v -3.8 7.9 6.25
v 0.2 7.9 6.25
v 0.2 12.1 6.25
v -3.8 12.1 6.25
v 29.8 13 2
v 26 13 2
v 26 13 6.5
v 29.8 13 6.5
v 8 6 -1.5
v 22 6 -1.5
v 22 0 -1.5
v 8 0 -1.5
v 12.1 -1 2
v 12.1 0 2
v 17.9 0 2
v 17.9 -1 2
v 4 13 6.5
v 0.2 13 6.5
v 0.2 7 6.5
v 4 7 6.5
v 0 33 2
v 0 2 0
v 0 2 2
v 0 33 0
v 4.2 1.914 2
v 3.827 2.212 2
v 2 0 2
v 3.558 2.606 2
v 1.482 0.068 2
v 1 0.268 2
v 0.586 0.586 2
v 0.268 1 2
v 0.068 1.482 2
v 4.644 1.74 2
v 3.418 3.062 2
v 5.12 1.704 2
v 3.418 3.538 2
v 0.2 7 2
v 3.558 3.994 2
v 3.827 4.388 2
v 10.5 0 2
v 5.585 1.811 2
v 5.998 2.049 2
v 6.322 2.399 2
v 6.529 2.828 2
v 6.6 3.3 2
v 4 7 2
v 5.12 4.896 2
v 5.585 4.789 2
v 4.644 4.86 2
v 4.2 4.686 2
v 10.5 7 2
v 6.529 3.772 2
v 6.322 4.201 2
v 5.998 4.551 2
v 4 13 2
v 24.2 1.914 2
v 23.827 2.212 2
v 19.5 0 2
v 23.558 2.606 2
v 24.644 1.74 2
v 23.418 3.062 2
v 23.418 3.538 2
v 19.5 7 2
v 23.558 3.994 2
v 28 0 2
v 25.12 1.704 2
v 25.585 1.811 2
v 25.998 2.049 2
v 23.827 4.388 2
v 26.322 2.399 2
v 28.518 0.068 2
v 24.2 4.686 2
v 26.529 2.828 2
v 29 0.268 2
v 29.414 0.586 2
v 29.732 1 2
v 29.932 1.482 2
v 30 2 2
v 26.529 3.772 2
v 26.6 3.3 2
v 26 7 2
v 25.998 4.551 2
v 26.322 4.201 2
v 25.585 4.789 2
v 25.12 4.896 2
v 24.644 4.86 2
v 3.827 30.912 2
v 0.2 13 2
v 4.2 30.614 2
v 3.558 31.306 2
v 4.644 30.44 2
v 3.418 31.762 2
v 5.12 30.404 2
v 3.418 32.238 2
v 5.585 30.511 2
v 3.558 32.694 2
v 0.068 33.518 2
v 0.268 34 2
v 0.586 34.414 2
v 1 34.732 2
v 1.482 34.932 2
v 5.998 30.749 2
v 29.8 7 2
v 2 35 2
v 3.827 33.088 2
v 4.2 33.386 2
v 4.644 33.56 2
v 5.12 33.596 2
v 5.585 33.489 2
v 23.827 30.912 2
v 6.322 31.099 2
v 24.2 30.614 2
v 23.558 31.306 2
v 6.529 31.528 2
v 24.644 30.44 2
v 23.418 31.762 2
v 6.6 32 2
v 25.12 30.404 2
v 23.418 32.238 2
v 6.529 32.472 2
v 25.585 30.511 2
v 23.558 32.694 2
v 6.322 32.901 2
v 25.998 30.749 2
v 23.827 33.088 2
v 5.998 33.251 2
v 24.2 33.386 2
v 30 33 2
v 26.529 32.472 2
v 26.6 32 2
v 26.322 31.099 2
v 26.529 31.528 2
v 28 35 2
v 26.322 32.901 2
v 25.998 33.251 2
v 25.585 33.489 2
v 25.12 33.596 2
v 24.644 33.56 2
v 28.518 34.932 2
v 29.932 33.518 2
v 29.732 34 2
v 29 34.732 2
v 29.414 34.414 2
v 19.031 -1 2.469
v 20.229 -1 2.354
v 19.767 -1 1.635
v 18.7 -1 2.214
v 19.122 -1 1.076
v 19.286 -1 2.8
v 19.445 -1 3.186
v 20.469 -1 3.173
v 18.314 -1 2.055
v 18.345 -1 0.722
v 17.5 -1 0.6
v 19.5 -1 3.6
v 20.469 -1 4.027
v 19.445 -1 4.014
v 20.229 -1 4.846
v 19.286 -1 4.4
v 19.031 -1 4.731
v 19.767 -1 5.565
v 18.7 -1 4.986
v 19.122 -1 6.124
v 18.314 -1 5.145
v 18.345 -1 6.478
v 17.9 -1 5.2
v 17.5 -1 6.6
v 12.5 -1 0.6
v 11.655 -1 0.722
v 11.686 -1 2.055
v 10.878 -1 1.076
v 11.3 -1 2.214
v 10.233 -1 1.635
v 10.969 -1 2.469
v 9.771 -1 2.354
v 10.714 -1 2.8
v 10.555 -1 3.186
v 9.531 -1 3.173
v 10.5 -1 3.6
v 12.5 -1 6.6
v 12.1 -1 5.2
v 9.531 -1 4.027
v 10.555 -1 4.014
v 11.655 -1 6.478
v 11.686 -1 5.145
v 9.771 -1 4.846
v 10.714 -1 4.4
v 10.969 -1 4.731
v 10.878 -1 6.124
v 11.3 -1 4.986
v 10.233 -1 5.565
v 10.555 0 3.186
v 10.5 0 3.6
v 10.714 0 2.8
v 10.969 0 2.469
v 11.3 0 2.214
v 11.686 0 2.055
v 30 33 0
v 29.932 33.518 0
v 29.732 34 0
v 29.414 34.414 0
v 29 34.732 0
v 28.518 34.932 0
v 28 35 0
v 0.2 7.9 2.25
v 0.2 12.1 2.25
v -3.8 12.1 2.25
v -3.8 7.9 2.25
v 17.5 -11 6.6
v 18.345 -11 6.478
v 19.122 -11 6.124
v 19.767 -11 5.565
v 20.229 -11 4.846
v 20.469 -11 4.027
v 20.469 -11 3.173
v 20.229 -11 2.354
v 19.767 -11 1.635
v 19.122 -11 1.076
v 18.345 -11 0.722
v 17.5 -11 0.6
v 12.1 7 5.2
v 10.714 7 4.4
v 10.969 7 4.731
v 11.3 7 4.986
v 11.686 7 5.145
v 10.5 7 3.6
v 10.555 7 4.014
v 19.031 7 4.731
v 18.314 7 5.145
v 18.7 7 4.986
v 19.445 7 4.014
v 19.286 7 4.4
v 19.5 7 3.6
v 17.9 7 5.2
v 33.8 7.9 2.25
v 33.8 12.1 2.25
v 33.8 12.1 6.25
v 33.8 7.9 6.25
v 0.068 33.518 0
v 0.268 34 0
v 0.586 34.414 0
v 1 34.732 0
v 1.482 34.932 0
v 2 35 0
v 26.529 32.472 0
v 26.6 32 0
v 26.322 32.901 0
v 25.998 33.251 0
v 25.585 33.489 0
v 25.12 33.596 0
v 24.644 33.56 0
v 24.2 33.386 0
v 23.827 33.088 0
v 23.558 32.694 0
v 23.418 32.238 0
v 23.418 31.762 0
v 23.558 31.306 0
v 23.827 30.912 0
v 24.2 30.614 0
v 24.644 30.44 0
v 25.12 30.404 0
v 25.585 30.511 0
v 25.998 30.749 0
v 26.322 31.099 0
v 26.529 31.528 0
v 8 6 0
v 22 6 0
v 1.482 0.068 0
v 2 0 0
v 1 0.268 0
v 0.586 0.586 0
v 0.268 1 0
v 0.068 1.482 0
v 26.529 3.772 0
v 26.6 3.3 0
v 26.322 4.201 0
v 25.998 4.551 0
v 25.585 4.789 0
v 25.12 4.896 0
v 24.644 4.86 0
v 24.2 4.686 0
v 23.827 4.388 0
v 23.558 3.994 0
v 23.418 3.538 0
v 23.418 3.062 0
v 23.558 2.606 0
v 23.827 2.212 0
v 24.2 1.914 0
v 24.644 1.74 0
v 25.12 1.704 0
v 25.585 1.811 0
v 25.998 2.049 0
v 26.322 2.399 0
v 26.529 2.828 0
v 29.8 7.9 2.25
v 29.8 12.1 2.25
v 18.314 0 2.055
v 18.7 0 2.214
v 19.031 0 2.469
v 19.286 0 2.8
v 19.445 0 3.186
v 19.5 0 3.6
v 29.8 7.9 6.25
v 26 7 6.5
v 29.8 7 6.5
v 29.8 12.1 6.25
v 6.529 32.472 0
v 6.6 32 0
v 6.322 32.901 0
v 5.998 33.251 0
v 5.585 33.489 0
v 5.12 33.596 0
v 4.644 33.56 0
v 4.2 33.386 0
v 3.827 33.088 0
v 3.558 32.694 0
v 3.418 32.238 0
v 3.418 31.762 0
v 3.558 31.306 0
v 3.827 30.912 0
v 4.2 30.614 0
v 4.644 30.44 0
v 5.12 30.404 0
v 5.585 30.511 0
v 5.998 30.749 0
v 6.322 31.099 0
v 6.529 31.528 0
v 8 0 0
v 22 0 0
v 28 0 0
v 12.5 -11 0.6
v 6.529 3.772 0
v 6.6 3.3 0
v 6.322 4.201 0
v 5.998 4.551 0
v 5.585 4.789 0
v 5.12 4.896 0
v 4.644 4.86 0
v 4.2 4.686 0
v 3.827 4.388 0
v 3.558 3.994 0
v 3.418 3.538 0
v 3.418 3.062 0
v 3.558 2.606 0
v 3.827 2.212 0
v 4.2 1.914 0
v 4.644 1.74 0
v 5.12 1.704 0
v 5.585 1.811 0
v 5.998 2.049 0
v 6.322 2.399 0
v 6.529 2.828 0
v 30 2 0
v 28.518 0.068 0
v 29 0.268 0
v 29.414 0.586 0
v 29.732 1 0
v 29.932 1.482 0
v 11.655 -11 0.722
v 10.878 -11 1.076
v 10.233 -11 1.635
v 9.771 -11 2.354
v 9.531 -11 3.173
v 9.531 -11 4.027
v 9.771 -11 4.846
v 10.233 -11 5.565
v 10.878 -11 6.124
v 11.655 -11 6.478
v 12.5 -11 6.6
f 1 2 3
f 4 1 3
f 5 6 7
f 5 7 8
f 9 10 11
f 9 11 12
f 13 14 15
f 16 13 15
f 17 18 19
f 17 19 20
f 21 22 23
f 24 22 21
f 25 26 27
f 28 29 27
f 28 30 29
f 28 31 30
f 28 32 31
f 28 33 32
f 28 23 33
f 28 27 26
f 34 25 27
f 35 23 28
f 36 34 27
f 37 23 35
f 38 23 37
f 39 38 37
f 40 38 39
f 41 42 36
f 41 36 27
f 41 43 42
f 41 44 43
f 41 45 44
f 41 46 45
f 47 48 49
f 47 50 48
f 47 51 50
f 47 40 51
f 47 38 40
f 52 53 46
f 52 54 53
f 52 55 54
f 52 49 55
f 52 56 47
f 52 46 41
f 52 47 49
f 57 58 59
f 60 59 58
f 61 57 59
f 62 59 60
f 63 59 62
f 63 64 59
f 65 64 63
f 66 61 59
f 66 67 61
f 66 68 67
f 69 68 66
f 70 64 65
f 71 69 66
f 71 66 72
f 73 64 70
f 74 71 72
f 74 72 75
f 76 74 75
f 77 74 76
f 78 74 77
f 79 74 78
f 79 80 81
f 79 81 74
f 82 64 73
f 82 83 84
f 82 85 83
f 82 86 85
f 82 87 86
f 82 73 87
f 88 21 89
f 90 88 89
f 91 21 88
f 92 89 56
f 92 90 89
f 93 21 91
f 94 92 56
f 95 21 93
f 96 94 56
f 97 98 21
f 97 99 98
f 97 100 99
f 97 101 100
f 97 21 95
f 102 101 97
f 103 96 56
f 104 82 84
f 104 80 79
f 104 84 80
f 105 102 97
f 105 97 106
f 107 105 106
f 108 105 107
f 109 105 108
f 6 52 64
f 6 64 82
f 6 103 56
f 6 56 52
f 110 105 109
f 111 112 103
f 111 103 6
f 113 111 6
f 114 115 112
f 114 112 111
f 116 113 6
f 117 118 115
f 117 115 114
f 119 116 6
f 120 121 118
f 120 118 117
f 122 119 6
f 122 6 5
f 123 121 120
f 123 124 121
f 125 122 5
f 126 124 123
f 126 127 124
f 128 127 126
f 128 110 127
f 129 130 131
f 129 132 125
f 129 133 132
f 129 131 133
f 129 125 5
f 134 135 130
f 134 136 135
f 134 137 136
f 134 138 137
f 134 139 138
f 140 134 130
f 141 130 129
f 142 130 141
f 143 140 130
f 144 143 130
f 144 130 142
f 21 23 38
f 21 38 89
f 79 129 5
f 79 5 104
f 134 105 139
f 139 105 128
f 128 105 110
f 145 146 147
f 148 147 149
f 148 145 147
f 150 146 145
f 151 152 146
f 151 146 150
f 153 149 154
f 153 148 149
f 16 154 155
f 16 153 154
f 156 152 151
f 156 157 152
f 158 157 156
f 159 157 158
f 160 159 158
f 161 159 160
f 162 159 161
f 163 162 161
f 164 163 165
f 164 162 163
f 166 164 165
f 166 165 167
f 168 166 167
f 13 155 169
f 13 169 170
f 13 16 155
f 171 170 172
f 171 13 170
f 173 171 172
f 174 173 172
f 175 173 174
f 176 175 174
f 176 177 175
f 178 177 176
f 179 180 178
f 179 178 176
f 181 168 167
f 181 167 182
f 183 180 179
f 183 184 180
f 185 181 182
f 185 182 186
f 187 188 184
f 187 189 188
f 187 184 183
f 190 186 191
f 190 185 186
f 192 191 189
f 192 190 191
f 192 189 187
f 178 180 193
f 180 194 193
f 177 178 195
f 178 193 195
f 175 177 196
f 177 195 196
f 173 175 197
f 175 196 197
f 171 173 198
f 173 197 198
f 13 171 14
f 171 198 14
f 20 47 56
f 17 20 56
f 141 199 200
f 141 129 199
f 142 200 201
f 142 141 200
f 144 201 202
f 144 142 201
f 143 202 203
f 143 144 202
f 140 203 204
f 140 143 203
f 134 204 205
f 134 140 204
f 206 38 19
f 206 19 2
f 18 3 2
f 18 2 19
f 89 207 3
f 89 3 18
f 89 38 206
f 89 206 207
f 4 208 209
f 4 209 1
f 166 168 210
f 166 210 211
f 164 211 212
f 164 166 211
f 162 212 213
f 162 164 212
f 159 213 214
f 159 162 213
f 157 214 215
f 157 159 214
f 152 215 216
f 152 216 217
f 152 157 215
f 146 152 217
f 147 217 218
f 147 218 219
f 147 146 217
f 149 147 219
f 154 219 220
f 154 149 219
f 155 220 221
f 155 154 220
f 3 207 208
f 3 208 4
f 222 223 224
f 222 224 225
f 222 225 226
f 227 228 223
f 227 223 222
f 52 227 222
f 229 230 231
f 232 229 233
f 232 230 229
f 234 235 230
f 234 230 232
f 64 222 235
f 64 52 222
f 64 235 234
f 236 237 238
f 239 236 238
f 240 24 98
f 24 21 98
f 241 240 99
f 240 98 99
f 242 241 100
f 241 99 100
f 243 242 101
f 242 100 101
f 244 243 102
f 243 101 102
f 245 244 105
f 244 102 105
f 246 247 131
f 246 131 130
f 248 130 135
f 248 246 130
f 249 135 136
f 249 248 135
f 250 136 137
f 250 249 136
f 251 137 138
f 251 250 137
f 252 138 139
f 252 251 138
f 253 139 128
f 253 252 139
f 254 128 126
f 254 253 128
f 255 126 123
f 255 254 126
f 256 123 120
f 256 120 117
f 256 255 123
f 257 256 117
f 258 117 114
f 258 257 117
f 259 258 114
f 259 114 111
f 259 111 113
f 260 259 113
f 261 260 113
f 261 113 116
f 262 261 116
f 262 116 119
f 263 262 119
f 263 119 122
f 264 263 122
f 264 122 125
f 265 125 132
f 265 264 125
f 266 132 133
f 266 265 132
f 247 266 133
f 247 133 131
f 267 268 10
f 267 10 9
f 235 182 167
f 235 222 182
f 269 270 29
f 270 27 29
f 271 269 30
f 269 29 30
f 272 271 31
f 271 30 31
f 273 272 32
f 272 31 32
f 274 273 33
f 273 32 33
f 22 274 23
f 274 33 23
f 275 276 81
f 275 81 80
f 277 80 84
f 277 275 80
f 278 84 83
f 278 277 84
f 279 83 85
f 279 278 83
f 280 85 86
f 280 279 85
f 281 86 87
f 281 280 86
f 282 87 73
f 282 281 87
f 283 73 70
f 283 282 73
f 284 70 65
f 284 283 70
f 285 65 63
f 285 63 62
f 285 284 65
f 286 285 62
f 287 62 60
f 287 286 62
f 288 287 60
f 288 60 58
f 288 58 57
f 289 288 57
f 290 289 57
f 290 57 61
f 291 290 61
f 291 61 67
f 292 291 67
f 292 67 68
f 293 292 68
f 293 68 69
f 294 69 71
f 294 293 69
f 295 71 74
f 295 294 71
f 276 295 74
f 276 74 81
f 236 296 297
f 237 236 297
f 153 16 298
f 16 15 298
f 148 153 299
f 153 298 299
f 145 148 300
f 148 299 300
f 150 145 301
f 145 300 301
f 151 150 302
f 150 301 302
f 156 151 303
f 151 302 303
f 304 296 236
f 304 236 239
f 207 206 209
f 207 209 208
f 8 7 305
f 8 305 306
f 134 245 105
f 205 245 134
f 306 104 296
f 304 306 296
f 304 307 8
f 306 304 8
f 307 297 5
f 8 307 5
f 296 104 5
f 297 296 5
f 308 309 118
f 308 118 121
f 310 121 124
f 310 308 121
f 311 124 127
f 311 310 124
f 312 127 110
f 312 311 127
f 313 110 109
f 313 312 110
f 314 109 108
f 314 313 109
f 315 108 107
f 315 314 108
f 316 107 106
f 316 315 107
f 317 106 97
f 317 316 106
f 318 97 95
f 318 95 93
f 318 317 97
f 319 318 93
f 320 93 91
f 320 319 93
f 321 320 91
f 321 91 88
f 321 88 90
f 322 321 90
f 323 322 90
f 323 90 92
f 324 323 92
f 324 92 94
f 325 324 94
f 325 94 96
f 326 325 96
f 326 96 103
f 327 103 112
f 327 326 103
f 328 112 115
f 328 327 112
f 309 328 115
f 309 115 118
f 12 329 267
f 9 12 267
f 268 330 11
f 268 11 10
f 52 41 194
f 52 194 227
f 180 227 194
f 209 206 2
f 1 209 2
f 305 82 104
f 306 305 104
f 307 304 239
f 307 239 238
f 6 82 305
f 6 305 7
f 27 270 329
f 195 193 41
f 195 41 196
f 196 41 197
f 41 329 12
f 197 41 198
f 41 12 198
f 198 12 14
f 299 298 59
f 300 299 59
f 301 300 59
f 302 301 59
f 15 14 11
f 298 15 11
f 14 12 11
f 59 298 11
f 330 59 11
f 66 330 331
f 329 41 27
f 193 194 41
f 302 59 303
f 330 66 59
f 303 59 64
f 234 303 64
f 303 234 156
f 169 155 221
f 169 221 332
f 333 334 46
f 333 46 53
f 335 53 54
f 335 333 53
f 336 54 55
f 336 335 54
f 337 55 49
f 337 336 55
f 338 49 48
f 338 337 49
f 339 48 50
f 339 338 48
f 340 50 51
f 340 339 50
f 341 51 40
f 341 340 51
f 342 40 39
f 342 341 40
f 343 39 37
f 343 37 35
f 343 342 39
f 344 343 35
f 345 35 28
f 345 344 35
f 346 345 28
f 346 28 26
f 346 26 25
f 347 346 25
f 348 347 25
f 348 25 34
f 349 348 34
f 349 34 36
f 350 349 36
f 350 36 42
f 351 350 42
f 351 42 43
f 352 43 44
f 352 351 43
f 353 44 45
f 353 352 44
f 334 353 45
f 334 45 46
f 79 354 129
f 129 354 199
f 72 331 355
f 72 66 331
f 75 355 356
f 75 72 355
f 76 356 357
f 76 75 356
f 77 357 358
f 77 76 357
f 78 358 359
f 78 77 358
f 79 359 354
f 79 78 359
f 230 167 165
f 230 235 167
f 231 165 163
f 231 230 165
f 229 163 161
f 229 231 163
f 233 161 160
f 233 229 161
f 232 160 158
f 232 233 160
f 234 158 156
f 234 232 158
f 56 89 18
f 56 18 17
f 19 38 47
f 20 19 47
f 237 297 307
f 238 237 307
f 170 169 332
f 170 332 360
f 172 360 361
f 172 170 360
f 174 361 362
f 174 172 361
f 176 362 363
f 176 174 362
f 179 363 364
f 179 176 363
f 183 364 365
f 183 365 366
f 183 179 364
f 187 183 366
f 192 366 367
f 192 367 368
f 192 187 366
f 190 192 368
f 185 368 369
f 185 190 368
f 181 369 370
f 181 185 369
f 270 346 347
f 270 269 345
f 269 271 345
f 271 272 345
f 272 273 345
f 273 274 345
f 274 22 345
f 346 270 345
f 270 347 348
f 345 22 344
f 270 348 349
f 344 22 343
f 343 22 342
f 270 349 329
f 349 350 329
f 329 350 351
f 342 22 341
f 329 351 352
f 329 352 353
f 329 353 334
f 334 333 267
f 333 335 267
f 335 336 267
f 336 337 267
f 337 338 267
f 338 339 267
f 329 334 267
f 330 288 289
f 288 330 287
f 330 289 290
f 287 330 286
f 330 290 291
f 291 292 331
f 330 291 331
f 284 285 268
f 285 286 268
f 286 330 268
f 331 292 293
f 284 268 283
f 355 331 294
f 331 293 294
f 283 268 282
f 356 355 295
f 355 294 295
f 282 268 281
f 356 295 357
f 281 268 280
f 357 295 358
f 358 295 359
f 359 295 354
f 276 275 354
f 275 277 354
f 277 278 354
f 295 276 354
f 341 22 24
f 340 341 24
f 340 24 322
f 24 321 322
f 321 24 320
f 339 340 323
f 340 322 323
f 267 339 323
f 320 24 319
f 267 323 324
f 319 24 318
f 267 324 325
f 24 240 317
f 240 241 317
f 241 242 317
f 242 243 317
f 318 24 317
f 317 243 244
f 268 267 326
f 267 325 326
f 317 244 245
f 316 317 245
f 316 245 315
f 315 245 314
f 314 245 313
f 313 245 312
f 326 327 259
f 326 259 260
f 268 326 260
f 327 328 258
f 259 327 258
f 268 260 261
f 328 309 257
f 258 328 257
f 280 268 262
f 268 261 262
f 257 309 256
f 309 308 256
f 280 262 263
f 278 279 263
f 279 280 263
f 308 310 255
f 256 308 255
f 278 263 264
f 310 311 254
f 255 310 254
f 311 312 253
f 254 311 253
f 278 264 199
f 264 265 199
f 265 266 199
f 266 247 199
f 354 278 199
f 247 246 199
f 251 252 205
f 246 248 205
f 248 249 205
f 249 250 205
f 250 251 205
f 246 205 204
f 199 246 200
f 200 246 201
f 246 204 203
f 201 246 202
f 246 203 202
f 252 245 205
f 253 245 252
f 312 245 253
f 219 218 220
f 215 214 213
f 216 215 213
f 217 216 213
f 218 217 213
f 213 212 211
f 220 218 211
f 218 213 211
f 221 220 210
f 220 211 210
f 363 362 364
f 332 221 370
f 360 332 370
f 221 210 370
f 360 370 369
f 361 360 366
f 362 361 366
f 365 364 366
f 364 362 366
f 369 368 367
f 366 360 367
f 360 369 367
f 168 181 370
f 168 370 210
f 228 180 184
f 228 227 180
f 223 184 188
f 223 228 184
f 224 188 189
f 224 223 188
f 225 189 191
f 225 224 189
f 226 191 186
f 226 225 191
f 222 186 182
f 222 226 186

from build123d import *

# Parameters (mm, degrees)
SKETCH_1_W      = 30
SKETCH_1_H      = 35
SKETCH_1_R      = 1.6
EXTRUDE_1_DEPTH = 2
SKETCH_2_W      = 9
SKETCH_2_H      = 8
EXTRUDE_2_DEPTH = 3.2
SKETCH_3_W      = 3.8
SKETCH_3_H      = 6
EXTRUDE_3_DEPTH = 4.5
SKETCH_4_W      = 14
SKETCH_4_H      = 6
EXTRUDE_4_DEPTH = 1.5
FILLET_1_R      = 1.6
FILLET_2_R      = 2
SKETCH_5_W      = 4
SKETCH_5_H      = 4.2
EXTRUDE_5_DEPTH = 4
EXTRUDE_6_DEPTH = 10


with BuildPart() as part:
    # 草图1 → 凸台-拉伸1 (new body)
    with BuildSketch(Plane.XY):
        with Locations((15, 17.5)):
            Rectangle(SKETCH_1_W, SKETCH_1_H)
        with Locations((5, 32)):
            Circle(SKETCH_1_R, mode=Mode.SUBTRACT)
        with Locations((25, 32)):
            Circle(SKETCH_1_R, mode=Mode.SUBTRACT)
        with Locations((5, 3.3)):
            Circle(SKETCH_1_R, mode=Mode.SUBTRACT)
        with Locations((25, 3.3)):
            Circle(SKETCH_1_R, mode=Mode.SUBTRACT)
    extrude(amount=EXTRUDE_1_DEPTH)

    # 草图2 → 凸台-拉伸2 (add)
    with BuildSketch(Plane.XY.offset(2)):
        with Locations((15, 3)):
            Rectangle(SKETCH_2_W, SKETCH_2_H)
    extrude(amount=EXTRUDE_2_DEPTH)

    # 草图3 → 凸台-拉伸3 (add)
    with BuildSketch(Plane.XY.offset(2)):
        with Locations((2.1, 10)):
            Rectangle(SKETCH_3_W, SKETCH_3_H)
        with Locations((27.9, 10)):
            Rectangle(SKETCH_3_W, SKETCH_3_H)
    extrude(amount=EXTRUDE_3_DEPTH)

    # 草图4 → 凸台-拉伸4 (add)
    with BuildSketch(Plane(origin=(0, 0, 0), x_dir=(-1, 0, 0), z_dir=(0, 0, -1))):
        with Locations((-15, 3)):
            Rectangle(SKETCH_4_W, SKETCH_4_H)
    extrude(amount=EXTRUDE_4_DEPTH)

    # 圆角1
    fillet_1_edges = [part.edges().sort_by_distance(p)[0] for p in [
        (19.5, 3, 5.2),
        (19.5, -0.5, 2),
        (10.5, -0.5, 2),
        (10.5, 3, 5.2),
    ]]
    fillet(fillet_1_edges, radius=FILLET_1_R - 0.0001)  # a hair under: the kernel refuses the full size

    # 圆角2
    fillet_2_edges = [part.edges().sort_by_distance(p)[0] for p in [
        (0, 35, 1),
        (30, 35, 1),
        (30, 0, 1),
        (0, 0, 1),
    ]]
    fillet(fillet_2_edges, radius=FILLET_2_R)

    # 草图5 → 凸台-拉伸5 (add)
    with BuildSketch(Plane.ZY.offset(-0.2)):
        with Locations((4.25, 10)):
            Rectangle(SKETCH_5_W, SKETCH_5_H)
    extrude_5 = extrude(amount=EXTRUDE_5_DEPTH)

    # 镜向1: 凸台-拉伸5 across plane
    add(extrude_5.mirror(Plane.ZY.offset(-15)))

    # 草图6 → 凸台-拉伸6 (add)
    with BuildSketch(Plane.XZ.offset(1)):
        with BuildLine():
            Line((17.5, 0.6), (12.5, 0.6))
            ThreePointArc((12.5, 0.6), (9.5, 3.6), (12.5, 6.6))
            Line((12.5, 6.6), (17.5, 6.6))
            ThreePointArc((17.5, 6.6), (20.5, 3.6), (17.5, 0.6))
        make_face()
    extrude(amount=EXTRUDE_6_DEPTH)


solid = part.part
